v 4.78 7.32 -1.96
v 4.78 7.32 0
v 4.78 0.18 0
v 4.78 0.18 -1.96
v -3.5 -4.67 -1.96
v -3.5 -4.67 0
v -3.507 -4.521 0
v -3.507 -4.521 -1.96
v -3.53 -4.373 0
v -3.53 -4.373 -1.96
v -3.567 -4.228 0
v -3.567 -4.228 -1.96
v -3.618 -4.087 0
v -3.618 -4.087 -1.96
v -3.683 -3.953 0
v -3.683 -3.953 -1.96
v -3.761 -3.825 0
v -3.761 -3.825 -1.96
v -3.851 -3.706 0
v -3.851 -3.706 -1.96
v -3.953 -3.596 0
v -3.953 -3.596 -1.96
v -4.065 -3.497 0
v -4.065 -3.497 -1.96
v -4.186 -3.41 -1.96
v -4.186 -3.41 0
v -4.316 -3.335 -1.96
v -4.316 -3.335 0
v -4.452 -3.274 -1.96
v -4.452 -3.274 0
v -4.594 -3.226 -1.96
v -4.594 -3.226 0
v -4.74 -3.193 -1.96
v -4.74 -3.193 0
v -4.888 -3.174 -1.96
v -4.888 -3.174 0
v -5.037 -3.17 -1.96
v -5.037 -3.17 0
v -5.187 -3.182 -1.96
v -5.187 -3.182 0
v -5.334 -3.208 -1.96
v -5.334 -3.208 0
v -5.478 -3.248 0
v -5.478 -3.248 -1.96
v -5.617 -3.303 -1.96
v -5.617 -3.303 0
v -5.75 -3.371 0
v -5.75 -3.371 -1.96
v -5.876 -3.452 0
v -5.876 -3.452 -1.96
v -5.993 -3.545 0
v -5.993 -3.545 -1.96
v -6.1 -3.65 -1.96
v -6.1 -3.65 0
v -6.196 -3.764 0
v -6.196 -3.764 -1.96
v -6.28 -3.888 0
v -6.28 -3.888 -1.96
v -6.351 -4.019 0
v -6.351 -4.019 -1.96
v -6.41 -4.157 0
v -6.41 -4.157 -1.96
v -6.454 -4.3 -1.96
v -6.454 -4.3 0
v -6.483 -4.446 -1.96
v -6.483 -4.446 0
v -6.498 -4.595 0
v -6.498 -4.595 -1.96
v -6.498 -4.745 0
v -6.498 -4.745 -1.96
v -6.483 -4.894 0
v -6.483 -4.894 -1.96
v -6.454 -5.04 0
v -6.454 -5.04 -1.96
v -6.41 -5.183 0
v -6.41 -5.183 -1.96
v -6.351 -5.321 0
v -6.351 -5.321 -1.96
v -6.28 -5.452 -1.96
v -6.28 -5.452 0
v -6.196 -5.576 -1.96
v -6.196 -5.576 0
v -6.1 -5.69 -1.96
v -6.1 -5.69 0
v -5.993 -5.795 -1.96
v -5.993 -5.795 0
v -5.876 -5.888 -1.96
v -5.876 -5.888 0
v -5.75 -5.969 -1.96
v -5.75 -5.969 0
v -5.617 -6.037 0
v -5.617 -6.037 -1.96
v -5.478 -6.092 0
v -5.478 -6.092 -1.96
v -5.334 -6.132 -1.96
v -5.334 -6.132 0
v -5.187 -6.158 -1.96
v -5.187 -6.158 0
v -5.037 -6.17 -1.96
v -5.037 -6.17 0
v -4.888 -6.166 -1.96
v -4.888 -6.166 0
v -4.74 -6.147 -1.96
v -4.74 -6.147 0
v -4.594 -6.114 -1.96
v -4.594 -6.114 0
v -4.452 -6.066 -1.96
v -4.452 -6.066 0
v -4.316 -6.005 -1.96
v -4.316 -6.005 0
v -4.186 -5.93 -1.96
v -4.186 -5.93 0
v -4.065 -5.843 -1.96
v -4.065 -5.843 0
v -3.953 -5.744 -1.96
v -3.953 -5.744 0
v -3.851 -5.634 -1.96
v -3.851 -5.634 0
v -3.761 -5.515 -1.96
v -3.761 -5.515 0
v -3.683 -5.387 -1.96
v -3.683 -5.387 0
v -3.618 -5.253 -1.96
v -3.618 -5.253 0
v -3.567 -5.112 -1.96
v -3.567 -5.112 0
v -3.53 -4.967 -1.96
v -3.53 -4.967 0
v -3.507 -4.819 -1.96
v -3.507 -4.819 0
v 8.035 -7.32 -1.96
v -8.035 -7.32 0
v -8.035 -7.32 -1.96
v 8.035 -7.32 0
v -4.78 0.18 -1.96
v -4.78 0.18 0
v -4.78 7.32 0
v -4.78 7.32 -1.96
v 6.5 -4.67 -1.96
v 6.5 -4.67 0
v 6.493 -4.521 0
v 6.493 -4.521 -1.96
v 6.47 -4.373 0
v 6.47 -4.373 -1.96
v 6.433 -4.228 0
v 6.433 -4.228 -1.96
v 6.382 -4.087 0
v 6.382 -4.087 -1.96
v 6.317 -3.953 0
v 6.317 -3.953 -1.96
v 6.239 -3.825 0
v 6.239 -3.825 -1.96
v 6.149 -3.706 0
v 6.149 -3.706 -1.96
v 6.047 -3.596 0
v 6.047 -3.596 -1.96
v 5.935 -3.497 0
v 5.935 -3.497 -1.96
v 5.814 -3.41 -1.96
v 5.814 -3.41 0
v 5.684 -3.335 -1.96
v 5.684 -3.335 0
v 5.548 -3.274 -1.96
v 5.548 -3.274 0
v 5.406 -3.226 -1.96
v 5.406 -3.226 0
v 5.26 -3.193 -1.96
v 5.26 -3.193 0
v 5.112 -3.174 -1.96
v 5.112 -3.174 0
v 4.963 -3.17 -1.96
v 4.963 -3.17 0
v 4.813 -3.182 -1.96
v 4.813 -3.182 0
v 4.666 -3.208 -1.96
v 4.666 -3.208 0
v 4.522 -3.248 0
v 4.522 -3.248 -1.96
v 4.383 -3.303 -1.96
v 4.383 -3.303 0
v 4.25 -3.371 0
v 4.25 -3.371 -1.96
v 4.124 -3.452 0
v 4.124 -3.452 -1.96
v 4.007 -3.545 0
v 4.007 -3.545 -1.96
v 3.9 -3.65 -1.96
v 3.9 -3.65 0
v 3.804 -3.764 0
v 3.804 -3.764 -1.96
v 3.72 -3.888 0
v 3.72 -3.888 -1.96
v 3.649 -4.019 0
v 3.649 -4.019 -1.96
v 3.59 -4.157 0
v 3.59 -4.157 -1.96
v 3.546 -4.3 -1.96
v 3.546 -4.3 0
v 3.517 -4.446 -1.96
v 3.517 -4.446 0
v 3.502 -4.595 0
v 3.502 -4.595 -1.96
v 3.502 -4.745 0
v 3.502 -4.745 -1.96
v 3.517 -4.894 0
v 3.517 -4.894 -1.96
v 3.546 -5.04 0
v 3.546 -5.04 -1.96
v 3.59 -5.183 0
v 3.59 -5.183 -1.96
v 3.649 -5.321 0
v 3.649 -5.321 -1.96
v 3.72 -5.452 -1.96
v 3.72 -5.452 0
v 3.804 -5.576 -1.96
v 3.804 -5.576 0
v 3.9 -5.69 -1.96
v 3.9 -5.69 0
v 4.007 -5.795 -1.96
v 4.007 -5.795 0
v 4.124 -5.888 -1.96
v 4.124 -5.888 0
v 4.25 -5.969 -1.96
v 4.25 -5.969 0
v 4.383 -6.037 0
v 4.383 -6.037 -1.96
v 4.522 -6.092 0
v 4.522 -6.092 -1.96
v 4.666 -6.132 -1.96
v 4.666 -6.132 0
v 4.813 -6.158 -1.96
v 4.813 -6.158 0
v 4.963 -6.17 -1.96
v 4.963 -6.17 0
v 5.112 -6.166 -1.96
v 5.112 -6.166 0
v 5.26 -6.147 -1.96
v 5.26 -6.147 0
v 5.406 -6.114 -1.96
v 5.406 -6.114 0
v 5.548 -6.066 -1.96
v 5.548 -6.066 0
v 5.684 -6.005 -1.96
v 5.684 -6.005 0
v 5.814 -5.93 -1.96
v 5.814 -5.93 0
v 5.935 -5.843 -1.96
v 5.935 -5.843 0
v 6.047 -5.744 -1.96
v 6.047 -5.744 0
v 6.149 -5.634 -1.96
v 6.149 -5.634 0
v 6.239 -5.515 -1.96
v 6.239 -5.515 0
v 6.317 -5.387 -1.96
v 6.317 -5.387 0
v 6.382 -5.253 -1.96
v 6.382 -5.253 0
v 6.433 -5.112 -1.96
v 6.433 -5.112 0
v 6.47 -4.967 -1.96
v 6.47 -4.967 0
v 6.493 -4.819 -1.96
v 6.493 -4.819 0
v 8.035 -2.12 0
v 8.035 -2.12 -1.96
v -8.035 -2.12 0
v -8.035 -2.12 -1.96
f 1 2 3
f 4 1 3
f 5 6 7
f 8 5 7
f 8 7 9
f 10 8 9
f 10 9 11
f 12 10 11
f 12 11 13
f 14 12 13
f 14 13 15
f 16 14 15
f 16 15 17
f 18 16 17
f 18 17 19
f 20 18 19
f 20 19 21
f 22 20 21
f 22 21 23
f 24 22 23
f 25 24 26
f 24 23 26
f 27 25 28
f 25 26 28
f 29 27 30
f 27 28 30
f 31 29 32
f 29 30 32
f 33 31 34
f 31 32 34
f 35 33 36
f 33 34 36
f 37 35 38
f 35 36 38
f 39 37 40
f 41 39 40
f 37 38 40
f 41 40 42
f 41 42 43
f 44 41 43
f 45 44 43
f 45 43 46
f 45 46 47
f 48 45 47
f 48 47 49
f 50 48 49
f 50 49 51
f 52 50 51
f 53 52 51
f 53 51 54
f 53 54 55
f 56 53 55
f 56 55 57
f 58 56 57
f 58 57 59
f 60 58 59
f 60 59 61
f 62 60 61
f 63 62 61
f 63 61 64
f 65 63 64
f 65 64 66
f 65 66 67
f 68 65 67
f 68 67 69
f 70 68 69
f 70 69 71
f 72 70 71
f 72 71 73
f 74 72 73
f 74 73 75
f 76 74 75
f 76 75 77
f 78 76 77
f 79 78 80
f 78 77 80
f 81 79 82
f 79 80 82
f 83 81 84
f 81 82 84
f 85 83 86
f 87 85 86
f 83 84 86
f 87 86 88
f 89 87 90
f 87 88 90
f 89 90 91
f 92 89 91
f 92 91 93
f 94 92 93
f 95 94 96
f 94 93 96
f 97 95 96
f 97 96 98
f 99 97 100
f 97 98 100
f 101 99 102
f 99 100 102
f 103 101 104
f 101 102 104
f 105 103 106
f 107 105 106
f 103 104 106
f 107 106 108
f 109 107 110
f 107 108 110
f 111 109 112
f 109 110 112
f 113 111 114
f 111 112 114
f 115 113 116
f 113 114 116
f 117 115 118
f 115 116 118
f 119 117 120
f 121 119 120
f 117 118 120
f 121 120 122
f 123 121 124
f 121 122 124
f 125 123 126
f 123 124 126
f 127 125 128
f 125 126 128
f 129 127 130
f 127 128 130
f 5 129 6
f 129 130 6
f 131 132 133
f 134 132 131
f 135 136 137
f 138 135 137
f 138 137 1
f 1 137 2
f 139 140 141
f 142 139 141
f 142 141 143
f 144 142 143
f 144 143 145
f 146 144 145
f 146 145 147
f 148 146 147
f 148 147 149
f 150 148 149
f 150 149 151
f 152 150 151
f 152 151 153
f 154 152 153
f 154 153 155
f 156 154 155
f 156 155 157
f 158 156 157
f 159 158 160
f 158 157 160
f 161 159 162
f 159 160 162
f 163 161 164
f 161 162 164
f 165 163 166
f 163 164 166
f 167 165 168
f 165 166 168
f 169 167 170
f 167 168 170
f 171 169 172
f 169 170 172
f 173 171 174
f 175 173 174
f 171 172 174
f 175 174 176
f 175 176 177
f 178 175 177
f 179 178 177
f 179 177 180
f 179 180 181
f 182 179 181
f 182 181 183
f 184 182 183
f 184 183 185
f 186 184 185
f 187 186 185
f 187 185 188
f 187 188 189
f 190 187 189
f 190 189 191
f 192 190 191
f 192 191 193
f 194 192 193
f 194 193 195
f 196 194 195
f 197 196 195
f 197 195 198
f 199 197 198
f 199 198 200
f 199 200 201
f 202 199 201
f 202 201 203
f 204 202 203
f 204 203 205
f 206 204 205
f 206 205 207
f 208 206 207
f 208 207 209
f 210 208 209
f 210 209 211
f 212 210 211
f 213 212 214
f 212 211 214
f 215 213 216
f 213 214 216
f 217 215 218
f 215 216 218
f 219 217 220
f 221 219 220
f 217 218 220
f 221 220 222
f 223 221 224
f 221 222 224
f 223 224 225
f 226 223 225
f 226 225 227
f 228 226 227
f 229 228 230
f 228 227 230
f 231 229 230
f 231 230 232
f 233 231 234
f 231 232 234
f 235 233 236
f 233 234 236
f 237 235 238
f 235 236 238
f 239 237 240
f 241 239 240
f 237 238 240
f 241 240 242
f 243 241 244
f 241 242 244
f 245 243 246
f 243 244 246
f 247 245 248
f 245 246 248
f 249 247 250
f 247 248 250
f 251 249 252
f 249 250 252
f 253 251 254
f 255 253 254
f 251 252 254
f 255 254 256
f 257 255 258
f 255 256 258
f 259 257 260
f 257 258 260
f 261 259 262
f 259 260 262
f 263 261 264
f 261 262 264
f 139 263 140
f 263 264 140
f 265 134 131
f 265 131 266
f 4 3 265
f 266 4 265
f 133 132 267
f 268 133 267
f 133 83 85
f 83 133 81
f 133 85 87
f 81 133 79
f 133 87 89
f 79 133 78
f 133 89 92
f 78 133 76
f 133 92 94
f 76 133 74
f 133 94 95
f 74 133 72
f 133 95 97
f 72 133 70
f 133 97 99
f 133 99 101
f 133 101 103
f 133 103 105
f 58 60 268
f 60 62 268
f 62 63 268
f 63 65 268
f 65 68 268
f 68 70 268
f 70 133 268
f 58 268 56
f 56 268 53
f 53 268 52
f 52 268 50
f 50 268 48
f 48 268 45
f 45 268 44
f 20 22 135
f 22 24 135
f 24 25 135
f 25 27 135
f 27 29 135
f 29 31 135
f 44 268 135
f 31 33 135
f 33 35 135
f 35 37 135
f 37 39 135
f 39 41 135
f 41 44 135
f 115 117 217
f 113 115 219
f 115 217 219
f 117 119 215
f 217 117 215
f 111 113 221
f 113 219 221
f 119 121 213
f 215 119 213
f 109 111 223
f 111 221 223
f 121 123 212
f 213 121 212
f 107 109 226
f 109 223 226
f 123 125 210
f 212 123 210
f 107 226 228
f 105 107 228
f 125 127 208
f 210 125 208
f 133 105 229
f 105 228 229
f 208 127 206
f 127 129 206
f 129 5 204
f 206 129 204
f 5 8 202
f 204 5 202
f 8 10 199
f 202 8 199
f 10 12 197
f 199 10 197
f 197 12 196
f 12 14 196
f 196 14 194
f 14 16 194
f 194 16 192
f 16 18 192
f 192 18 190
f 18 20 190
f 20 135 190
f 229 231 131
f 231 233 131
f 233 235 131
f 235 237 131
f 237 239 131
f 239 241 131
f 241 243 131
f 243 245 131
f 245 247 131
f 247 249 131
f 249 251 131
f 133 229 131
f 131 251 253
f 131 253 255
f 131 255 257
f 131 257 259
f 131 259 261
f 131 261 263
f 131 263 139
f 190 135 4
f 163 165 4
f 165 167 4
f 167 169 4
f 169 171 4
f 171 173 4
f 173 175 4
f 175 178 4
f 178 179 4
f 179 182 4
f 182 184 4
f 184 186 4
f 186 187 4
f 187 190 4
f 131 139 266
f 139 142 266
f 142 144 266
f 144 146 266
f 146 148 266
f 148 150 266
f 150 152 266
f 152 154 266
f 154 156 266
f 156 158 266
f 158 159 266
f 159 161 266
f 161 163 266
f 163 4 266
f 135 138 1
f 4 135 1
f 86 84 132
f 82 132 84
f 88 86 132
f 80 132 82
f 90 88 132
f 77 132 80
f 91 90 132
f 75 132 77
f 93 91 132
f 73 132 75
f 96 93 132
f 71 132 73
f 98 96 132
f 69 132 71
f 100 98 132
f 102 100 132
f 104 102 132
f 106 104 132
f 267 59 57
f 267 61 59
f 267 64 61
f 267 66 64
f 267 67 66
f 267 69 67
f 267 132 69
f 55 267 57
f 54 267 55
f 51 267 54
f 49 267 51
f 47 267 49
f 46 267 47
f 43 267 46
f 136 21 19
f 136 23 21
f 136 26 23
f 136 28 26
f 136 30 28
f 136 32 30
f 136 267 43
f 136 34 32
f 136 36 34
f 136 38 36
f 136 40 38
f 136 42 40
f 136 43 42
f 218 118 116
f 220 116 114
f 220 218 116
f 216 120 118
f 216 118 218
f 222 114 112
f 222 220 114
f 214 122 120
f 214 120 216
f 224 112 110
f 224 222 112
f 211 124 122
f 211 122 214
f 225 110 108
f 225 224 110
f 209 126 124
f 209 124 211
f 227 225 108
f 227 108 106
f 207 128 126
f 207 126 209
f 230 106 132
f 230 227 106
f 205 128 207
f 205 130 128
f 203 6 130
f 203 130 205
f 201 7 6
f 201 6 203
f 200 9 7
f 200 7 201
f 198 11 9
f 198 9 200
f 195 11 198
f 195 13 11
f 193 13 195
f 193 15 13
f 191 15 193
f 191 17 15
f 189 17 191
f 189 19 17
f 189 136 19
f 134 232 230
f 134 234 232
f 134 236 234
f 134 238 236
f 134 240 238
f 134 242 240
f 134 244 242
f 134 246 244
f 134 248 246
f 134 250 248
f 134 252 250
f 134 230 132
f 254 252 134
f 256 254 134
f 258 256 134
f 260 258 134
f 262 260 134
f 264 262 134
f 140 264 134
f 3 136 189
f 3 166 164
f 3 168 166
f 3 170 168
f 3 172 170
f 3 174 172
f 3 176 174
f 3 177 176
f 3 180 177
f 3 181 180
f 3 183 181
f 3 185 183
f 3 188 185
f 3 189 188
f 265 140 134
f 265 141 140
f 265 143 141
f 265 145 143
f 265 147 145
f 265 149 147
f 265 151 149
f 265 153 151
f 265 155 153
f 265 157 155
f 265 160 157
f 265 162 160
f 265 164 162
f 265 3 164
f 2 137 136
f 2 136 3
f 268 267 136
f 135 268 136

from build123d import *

# Parameters (mm, degrees)
SCHIZZO1_W                   = 16.07
SCHIZZO1_H                   = 14.64
ESTRUSIONE_ESTRUSIONE1_DEPTH = 1.96
TAGLIO_ESTRUSIONE1_DEPTH     = 12.044692164
SCHIZZO3_R                   = 1.5
TAGLIO_ESTRUSIONE2_DEPTH     = 12.044692164


with BuildPart() as part:
    # Schizzo1 → Estrusione-Estrusione1 (new body)
    with BuildSketch(Plane.XY):
        Rectangle(SCHIZZO1_W, SCHIZZO1_H)
    extrude(amount=-ESTRUSIONE_ESTRUSIONE1_DEPTH)

    # Schizzo2 → Taglio-Estrusione1 (cut, through all)
    with BuildSketch(Plane.XY):
        Polygon((-4.78, 0.18), (-4.78, 7.32), (-8.035, 7.32), (-8.035, -2.12), align=None)
        Polygon((8.035, 7.32), (4.78, 7.32), (4.78, 0.18), (8.035, -2.12), align=None)
    extrude(amount=-TAGLIO_ESTRUSIONE1_DEPTH, mode=Mode.SUBTRACT)

    # Schizzo3 → Taglio-Estrusione2 (cut, through all)
    with BuildSketch(Plane.XY):
        with Locations((-5, -4.67)):
            Circle(SCHIZZO3_R)
        with Locations((5, -4.67)):
            Circle(SCHIZZO3_R)
    extrude(amount=-TAGLIO_ESTRUSIONE2_DEPTH, mode=Mode.SUBTRACT)


solid = part.part
